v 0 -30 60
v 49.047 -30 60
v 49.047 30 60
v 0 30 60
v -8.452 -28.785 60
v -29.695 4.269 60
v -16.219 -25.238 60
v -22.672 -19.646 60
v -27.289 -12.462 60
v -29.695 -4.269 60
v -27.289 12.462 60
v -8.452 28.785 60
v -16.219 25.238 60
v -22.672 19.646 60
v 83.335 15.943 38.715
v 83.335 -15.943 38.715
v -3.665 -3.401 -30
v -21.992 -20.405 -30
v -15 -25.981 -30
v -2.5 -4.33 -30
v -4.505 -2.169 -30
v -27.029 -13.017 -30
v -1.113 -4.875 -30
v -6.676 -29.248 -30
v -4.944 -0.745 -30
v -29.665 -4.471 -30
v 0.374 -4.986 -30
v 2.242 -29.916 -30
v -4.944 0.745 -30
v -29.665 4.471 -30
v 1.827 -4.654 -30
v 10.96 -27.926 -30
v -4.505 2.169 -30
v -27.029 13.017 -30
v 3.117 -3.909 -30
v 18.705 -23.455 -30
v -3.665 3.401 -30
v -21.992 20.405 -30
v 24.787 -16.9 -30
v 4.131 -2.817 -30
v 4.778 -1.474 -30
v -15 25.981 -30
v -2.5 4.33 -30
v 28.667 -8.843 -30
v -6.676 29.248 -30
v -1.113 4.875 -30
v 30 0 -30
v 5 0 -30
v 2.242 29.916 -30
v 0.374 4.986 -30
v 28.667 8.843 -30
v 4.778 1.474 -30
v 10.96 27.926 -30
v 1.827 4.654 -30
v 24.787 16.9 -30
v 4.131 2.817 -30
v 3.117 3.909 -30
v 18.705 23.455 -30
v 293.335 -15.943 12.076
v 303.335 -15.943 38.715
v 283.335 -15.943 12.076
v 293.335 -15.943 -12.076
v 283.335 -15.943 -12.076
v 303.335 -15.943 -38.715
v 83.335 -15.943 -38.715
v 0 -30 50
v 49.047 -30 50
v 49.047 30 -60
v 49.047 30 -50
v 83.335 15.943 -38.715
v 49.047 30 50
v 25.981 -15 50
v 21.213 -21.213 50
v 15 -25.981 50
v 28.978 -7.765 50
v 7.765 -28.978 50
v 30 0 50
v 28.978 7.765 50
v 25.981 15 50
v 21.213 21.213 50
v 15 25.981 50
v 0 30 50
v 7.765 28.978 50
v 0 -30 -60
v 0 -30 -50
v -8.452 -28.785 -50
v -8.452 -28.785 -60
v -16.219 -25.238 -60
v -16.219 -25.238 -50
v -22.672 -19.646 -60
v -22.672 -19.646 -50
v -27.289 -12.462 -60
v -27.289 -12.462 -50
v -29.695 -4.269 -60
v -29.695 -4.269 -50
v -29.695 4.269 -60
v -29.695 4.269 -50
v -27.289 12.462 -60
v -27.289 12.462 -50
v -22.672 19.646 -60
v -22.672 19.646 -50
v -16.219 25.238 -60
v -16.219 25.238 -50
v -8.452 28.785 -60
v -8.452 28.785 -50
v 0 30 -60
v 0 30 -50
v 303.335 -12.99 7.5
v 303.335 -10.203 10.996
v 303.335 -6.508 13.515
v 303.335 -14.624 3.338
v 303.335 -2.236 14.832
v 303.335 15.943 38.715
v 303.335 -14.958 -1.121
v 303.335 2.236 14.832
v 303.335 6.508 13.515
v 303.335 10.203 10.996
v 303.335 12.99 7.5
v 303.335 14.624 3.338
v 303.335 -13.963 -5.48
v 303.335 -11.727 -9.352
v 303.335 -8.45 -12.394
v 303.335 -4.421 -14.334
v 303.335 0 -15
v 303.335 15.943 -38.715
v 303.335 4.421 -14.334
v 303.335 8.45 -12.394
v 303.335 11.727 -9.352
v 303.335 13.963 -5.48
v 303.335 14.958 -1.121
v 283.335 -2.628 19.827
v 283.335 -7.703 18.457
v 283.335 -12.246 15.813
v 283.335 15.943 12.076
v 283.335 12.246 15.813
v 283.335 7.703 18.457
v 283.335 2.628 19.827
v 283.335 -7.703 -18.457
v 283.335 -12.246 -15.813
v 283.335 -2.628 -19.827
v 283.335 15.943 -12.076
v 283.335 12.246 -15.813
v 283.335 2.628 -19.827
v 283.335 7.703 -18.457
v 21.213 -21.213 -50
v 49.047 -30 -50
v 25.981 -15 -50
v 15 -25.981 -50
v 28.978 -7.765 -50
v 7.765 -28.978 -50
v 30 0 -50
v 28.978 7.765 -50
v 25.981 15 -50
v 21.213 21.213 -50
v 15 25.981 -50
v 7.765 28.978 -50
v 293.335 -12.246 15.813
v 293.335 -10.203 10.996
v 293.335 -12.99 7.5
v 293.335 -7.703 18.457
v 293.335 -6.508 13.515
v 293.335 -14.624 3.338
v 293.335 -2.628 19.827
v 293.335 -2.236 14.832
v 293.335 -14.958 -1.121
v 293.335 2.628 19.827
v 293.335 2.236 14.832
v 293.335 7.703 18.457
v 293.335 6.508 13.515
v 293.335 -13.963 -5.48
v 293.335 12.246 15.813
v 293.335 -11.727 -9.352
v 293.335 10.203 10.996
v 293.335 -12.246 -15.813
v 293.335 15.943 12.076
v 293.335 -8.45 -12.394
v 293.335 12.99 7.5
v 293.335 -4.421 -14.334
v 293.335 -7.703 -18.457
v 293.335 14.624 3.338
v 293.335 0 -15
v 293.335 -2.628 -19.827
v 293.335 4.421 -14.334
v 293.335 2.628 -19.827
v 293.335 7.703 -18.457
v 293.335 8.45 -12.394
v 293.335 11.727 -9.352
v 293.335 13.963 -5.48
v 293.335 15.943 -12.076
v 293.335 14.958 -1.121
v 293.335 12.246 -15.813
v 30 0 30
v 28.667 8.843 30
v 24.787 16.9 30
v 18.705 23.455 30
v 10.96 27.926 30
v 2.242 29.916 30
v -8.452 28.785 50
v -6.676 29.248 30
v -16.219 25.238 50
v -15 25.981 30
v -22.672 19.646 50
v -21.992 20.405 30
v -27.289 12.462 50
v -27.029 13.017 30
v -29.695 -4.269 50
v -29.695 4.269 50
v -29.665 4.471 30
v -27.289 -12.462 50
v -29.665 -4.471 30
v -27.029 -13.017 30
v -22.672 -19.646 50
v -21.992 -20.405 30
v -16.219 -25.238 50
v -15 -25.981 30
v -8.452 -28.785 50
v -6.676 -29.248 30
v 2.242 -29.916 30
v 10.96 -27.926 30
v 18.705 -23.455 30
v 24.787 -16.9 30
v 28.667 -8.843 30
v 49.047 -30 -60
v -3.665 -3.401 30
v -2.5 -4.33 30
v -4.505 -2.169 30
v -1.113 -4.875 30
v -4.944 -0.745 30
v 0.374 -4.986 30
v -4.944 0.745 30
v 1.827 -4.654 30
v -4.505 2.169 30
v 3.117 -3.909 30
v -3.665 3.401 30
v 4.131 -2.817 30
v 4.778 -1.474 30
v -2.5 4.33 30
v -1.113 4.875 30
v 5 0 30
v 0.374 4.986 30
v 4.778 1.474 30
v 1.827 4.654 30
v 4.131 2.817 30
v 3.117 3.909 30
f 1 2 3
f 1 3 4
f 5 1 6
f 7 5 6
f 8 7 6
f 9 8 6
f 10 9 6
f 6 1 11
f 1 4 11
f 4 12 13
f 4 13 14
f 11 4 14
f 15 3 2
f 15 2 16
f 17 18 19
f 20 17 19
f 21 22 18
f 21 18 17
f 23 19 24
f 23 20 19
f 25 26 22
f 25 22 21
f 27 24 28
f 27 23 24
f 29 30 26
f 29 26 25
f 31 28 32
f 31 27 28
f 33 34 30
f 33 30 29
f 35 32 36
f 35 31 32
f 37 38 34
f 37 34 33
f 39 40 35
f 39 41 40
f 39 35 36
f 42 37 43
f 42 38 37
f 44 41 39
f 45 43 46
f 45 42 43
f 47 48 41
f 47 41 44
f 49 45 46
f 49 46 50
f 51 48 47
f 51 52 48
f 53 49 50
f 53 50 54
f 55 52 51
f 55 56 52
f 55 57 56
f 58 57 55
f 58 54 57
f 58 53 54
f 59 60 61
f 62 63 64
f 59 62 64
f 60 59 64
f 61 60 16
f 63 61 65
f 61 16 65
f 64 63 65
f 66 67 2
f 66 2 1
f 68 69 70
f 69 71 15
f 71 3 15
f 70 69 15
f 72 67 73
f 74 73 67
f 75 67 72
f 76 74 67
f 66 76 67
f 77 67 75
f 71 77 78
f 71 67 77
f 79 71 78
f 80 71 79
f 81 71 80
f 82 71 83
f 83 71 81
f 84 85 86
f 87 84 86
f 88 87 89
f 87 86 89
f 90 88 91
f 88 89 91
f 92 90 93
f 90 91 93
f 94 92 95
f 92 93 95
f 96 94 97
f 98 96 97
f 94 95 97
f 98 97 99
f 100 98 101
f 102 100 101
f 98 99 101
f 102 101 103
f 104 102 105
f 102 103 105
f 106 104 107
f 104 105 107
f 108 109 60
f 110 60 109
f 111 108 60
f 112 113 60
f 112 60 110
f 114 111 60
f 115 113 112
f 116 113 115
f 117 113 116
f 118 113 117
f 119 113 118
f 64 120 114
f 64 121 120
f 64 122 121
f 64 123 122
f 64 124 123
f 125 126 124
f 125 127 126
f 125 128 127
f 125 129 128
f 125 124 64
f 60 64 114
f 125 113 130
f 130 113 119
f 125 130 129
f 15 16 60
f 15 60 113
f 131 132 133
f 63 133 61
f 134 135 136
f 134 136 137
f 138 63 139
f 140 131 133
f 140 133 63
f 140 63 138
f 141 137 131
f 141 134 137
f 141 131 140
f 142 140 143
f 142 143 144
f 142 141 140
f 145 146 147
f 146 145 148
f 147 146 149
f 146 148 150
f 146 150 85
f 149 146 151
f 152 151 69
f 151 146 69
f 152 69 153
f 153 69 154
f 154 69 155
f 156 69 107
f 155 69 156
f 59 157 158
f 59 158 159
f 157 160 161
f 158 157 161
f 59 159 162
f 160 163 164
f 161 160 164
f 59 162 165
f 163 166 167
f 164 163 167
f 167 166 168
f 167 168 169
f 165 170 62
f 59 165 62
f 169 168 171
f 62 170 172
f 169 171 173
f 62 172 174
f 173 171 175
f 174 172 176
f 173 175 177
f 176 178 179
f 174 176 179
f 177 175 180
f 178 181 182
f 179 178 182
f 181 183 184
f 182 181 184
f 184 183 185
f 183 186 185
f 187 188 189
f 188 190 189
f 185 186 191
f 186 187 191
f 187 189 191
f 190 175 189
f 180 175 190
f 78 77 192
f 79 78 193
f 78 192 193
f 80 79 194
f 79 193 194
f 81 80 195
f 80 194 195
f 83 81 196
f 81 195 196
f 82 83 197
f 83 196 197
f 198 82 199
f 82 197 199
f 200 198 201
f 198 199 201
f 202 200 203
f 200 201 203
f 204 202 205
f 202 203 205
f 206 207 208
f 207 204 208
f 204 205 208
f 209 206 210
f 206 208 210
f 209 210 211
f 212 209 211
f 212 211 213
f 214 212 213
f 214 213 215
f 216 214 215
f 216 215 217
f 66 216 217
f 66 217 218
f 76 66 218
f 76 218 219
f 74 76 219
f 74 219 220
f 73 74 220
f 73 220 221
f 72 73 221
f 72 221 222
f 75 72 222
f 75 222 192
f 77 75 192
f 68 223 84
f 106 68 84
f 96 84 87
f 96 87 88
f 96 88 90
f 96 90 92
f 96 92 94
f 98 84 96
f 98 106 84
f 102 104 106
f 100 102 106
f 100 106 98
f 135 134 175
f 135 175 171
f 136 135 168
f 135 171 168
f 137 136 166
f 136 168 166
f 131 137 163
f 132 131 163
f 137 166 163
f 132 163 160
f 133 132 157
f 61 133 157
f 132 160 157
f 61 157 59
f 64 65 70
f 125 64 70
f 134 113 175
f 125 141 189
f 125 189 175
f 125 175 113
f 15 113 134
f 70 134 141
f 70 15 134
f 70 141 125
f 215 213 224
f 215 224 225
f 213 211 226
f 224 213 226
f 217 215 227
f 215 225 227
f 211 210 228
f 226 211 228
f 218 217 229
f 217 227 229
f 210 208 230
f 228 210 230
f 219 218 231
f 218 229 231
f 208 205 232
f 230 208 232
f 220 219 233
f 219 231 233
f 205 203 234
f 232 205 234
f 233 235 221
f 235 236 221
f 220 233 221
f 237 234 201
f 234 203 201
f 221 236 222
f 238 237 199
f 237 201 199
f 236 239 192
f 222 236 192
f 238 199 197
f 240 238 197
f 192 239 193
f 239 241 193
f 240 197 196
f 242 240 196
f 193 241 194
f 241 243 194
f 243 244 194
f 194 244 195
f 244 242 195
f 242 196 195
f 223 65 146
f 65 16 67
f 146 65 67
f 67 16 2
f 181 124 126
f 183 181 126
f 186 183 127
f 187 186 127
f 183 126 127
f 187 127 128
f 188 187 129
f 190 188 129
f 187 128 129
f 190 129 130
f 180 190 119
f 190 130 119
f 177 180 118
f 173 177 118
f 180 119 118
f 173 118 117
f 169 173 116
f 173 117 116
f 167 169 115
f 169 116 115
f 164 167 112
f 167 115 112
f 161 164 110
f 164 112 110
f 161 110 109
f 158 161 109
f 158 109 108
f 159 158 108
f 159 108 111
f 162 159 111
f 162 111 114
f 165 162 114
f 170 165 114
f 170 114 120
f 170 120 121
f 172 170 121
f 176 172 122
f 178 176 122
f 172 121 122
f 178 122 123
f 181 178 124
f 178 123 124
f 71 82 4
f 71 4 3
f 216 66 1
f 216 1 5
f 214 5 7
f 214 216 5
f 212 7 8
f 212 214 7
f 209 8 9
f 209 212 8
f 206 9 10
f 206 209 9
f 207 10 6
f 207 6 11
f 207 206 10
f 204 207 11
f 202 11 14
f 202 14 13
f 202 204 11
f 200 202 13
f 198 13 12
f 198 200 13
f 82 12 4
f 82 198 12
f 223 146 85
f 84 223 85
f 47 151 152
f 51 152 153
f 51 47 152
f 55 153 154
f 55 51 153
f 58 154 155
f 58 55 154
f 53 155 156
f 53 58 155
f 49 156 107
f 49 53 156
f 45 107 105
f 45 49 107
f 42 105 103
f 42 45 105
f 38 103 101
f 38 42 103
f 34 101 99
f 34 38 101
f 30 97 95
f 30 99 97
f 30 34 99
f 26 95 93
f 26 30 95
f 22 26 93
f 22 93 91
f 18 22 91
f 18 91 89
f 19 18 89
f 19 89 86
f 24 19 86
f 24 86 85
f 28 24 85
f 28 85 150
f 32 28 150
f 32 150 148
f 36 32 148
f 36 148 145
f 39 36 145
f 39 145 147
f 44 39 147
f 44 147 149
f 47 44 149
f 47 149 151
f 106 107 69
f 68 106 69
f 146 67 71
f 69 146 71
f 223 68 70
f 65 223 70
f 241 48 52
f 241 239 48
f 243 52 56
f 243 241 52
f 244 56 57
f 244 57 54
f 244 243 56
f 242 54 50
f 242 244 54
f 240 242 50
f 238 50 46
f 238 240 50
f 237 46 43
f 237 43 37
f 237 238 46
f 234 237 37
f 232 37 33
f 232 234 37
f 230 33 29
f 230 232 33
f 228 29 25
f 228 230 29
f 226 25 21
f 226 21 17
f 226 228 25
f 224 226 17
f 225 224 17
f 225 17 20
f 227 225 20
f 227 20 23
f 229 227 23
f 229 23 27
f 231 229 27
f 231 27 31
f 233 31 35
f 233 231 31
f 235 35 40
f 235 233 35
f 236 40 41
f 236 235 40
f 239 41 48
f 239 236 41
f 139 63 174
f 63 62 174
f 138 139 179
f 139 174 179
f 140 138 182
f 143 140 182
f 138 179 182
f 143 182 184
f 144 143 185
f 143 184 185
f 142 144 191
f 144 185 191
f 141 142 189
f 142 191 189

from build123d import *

# Parameters (mm, degrees)
SKETCH1_R                    = 5
BOSS_EXTRUDE1_DEPTH          = 30
SKETCH2_R                    = 30
BOSS_EXTRUDE2_DEPTH          = 20
BOSS_EXTRUDE3_DEPTH          = 10
BOSS_EXTRUDE4_DEPTH          = 60
CUT_EXTRUDE2_DEPTH           = 107.979678493
SCHIZZO1_W                   = 77.430619172
SCHIZZO1_H                   = 31.885326398
ESTRUSIONE_ESTRUSIONE1_DEPTH = 220
SKETCH8_R                    = 15
CUT_EXTRUDE3_DEPTH           = 10
SKETCH9_R                    = 20
CUT_EXTRUDE4_DEPTH           = 10


with BuildPart() as part:
    # Sketch1 → Boss-Extrude1 (new, symmetric)
    with BuildSketch(Plane.XY):
        Circle(SKETCH1_R)
    extrude(amount=BOSS_EXTRUDE1_DEPTH, both=True)

    # Sketch2 → Boss-Extrude2 (add)
    with BuildSketch(Plane.XY.offset(30)):
        Circle(SKETCH2_R)
    boss_extrude2 = extrude(amount=BOSS_EXTRUDE2_DEPTH)

    # Mirror1: Boss-Extrude2 across plane
    add(boss_extrude2.mirror(Plane.XY))

    # Sketch5 → Boss-Extrude3 (add)
    with BuildSketch(Plane.XY.offset(50)):
        with BuildLine():
            Line((49.046850524, 30), (49.046850524, -30))
            Line((49.046850524, -30), (0, -30))
            ThreePointArc((0, -30), (-30, 0), (0, 30))
            Line((0, 30), (49.046850524, 30))
        make_face()
    boss_extrude3 = extrude(amount=BOSS_EXTRUDE3_DEPTH)

    # Mirror3: Boss-Extrude3 across plane
    add(boss_extrude3.mirror(Plane.XY))

    # Sketch6 → Boss-Extrude4 (add, symmetric)
    with BuildSketch(Plane.XY):
        Polygon((49.046850524, -30), (49.046850524, 30), (83.33457632, 15.942663199), (83.33457632, -15.942663199), align=None)
    extrude(amount=BOSS_EXTRUDE4_DEPTH, both=True)

    # Sketch7 → Cut-Extrude2 (cut, symmetric)
    with BuildSketch(Plane(origin=(0, 0, 0), x_dir=(1, 0, 0), z_dir=(0, 1, 0))):
        Polygon((-220.635461706, 227.409893565), (49.046850524, 60), (92.240822161, 33.186605623), (361.923134392, -134.223287942), (696.742921522, 405.141336519), (114.184325424, 766.774518026), align=None)
    cut_extrude2 = extrude(amount=CUT_EXTRUDE2_DEPTH, both=True, mode=Mode.SUBTRACT)

    # Mirror4: Cut-Extrude2 across plane
    add(cut_extrude2.mirror(Plane.XY), mode=Mode.SUBTRACT)

    # Schizzo1 → Estrusione-Estrusione1 (add)
    with BuildSketch(Plane(origin=(83.33457632, 0, 0), x_dir=(0, 0, -1), z_dir=(1, 0, 0))):
        Rectangle(SCHIZZO1_W, SCHIZZO1_H)
    extrude(amount=ESTRUSIONE_ESTRUSIONE1_DEPTH)

    # Sketch8 → Cut-Extrude3 (cut)
    with BuildSketch(Plane(origin=(303.33457632, 0, 0), x_dir=(0, 0, -1), z_dir=(1, 0, 0))):
        Circle(SKETCH8_R)
    extrude(amount=-CUT_EXTRUDE3_DEPTH, mode=Mode.SUBTRACT)

    # Sketch9 → Cut-Extrude4 (cut)
    with BuildSketch(Plane(origin=(293.33457632, 0, 0), x_dir=(0, 0, -1), z_dir=(1, 0, 0))):
        Circle(SKETCH9_R)
    extrude(amount=-CUT_EXTRUDE4_DEPTH, mode=Mode.SUBTRACT)


solid = part.part
